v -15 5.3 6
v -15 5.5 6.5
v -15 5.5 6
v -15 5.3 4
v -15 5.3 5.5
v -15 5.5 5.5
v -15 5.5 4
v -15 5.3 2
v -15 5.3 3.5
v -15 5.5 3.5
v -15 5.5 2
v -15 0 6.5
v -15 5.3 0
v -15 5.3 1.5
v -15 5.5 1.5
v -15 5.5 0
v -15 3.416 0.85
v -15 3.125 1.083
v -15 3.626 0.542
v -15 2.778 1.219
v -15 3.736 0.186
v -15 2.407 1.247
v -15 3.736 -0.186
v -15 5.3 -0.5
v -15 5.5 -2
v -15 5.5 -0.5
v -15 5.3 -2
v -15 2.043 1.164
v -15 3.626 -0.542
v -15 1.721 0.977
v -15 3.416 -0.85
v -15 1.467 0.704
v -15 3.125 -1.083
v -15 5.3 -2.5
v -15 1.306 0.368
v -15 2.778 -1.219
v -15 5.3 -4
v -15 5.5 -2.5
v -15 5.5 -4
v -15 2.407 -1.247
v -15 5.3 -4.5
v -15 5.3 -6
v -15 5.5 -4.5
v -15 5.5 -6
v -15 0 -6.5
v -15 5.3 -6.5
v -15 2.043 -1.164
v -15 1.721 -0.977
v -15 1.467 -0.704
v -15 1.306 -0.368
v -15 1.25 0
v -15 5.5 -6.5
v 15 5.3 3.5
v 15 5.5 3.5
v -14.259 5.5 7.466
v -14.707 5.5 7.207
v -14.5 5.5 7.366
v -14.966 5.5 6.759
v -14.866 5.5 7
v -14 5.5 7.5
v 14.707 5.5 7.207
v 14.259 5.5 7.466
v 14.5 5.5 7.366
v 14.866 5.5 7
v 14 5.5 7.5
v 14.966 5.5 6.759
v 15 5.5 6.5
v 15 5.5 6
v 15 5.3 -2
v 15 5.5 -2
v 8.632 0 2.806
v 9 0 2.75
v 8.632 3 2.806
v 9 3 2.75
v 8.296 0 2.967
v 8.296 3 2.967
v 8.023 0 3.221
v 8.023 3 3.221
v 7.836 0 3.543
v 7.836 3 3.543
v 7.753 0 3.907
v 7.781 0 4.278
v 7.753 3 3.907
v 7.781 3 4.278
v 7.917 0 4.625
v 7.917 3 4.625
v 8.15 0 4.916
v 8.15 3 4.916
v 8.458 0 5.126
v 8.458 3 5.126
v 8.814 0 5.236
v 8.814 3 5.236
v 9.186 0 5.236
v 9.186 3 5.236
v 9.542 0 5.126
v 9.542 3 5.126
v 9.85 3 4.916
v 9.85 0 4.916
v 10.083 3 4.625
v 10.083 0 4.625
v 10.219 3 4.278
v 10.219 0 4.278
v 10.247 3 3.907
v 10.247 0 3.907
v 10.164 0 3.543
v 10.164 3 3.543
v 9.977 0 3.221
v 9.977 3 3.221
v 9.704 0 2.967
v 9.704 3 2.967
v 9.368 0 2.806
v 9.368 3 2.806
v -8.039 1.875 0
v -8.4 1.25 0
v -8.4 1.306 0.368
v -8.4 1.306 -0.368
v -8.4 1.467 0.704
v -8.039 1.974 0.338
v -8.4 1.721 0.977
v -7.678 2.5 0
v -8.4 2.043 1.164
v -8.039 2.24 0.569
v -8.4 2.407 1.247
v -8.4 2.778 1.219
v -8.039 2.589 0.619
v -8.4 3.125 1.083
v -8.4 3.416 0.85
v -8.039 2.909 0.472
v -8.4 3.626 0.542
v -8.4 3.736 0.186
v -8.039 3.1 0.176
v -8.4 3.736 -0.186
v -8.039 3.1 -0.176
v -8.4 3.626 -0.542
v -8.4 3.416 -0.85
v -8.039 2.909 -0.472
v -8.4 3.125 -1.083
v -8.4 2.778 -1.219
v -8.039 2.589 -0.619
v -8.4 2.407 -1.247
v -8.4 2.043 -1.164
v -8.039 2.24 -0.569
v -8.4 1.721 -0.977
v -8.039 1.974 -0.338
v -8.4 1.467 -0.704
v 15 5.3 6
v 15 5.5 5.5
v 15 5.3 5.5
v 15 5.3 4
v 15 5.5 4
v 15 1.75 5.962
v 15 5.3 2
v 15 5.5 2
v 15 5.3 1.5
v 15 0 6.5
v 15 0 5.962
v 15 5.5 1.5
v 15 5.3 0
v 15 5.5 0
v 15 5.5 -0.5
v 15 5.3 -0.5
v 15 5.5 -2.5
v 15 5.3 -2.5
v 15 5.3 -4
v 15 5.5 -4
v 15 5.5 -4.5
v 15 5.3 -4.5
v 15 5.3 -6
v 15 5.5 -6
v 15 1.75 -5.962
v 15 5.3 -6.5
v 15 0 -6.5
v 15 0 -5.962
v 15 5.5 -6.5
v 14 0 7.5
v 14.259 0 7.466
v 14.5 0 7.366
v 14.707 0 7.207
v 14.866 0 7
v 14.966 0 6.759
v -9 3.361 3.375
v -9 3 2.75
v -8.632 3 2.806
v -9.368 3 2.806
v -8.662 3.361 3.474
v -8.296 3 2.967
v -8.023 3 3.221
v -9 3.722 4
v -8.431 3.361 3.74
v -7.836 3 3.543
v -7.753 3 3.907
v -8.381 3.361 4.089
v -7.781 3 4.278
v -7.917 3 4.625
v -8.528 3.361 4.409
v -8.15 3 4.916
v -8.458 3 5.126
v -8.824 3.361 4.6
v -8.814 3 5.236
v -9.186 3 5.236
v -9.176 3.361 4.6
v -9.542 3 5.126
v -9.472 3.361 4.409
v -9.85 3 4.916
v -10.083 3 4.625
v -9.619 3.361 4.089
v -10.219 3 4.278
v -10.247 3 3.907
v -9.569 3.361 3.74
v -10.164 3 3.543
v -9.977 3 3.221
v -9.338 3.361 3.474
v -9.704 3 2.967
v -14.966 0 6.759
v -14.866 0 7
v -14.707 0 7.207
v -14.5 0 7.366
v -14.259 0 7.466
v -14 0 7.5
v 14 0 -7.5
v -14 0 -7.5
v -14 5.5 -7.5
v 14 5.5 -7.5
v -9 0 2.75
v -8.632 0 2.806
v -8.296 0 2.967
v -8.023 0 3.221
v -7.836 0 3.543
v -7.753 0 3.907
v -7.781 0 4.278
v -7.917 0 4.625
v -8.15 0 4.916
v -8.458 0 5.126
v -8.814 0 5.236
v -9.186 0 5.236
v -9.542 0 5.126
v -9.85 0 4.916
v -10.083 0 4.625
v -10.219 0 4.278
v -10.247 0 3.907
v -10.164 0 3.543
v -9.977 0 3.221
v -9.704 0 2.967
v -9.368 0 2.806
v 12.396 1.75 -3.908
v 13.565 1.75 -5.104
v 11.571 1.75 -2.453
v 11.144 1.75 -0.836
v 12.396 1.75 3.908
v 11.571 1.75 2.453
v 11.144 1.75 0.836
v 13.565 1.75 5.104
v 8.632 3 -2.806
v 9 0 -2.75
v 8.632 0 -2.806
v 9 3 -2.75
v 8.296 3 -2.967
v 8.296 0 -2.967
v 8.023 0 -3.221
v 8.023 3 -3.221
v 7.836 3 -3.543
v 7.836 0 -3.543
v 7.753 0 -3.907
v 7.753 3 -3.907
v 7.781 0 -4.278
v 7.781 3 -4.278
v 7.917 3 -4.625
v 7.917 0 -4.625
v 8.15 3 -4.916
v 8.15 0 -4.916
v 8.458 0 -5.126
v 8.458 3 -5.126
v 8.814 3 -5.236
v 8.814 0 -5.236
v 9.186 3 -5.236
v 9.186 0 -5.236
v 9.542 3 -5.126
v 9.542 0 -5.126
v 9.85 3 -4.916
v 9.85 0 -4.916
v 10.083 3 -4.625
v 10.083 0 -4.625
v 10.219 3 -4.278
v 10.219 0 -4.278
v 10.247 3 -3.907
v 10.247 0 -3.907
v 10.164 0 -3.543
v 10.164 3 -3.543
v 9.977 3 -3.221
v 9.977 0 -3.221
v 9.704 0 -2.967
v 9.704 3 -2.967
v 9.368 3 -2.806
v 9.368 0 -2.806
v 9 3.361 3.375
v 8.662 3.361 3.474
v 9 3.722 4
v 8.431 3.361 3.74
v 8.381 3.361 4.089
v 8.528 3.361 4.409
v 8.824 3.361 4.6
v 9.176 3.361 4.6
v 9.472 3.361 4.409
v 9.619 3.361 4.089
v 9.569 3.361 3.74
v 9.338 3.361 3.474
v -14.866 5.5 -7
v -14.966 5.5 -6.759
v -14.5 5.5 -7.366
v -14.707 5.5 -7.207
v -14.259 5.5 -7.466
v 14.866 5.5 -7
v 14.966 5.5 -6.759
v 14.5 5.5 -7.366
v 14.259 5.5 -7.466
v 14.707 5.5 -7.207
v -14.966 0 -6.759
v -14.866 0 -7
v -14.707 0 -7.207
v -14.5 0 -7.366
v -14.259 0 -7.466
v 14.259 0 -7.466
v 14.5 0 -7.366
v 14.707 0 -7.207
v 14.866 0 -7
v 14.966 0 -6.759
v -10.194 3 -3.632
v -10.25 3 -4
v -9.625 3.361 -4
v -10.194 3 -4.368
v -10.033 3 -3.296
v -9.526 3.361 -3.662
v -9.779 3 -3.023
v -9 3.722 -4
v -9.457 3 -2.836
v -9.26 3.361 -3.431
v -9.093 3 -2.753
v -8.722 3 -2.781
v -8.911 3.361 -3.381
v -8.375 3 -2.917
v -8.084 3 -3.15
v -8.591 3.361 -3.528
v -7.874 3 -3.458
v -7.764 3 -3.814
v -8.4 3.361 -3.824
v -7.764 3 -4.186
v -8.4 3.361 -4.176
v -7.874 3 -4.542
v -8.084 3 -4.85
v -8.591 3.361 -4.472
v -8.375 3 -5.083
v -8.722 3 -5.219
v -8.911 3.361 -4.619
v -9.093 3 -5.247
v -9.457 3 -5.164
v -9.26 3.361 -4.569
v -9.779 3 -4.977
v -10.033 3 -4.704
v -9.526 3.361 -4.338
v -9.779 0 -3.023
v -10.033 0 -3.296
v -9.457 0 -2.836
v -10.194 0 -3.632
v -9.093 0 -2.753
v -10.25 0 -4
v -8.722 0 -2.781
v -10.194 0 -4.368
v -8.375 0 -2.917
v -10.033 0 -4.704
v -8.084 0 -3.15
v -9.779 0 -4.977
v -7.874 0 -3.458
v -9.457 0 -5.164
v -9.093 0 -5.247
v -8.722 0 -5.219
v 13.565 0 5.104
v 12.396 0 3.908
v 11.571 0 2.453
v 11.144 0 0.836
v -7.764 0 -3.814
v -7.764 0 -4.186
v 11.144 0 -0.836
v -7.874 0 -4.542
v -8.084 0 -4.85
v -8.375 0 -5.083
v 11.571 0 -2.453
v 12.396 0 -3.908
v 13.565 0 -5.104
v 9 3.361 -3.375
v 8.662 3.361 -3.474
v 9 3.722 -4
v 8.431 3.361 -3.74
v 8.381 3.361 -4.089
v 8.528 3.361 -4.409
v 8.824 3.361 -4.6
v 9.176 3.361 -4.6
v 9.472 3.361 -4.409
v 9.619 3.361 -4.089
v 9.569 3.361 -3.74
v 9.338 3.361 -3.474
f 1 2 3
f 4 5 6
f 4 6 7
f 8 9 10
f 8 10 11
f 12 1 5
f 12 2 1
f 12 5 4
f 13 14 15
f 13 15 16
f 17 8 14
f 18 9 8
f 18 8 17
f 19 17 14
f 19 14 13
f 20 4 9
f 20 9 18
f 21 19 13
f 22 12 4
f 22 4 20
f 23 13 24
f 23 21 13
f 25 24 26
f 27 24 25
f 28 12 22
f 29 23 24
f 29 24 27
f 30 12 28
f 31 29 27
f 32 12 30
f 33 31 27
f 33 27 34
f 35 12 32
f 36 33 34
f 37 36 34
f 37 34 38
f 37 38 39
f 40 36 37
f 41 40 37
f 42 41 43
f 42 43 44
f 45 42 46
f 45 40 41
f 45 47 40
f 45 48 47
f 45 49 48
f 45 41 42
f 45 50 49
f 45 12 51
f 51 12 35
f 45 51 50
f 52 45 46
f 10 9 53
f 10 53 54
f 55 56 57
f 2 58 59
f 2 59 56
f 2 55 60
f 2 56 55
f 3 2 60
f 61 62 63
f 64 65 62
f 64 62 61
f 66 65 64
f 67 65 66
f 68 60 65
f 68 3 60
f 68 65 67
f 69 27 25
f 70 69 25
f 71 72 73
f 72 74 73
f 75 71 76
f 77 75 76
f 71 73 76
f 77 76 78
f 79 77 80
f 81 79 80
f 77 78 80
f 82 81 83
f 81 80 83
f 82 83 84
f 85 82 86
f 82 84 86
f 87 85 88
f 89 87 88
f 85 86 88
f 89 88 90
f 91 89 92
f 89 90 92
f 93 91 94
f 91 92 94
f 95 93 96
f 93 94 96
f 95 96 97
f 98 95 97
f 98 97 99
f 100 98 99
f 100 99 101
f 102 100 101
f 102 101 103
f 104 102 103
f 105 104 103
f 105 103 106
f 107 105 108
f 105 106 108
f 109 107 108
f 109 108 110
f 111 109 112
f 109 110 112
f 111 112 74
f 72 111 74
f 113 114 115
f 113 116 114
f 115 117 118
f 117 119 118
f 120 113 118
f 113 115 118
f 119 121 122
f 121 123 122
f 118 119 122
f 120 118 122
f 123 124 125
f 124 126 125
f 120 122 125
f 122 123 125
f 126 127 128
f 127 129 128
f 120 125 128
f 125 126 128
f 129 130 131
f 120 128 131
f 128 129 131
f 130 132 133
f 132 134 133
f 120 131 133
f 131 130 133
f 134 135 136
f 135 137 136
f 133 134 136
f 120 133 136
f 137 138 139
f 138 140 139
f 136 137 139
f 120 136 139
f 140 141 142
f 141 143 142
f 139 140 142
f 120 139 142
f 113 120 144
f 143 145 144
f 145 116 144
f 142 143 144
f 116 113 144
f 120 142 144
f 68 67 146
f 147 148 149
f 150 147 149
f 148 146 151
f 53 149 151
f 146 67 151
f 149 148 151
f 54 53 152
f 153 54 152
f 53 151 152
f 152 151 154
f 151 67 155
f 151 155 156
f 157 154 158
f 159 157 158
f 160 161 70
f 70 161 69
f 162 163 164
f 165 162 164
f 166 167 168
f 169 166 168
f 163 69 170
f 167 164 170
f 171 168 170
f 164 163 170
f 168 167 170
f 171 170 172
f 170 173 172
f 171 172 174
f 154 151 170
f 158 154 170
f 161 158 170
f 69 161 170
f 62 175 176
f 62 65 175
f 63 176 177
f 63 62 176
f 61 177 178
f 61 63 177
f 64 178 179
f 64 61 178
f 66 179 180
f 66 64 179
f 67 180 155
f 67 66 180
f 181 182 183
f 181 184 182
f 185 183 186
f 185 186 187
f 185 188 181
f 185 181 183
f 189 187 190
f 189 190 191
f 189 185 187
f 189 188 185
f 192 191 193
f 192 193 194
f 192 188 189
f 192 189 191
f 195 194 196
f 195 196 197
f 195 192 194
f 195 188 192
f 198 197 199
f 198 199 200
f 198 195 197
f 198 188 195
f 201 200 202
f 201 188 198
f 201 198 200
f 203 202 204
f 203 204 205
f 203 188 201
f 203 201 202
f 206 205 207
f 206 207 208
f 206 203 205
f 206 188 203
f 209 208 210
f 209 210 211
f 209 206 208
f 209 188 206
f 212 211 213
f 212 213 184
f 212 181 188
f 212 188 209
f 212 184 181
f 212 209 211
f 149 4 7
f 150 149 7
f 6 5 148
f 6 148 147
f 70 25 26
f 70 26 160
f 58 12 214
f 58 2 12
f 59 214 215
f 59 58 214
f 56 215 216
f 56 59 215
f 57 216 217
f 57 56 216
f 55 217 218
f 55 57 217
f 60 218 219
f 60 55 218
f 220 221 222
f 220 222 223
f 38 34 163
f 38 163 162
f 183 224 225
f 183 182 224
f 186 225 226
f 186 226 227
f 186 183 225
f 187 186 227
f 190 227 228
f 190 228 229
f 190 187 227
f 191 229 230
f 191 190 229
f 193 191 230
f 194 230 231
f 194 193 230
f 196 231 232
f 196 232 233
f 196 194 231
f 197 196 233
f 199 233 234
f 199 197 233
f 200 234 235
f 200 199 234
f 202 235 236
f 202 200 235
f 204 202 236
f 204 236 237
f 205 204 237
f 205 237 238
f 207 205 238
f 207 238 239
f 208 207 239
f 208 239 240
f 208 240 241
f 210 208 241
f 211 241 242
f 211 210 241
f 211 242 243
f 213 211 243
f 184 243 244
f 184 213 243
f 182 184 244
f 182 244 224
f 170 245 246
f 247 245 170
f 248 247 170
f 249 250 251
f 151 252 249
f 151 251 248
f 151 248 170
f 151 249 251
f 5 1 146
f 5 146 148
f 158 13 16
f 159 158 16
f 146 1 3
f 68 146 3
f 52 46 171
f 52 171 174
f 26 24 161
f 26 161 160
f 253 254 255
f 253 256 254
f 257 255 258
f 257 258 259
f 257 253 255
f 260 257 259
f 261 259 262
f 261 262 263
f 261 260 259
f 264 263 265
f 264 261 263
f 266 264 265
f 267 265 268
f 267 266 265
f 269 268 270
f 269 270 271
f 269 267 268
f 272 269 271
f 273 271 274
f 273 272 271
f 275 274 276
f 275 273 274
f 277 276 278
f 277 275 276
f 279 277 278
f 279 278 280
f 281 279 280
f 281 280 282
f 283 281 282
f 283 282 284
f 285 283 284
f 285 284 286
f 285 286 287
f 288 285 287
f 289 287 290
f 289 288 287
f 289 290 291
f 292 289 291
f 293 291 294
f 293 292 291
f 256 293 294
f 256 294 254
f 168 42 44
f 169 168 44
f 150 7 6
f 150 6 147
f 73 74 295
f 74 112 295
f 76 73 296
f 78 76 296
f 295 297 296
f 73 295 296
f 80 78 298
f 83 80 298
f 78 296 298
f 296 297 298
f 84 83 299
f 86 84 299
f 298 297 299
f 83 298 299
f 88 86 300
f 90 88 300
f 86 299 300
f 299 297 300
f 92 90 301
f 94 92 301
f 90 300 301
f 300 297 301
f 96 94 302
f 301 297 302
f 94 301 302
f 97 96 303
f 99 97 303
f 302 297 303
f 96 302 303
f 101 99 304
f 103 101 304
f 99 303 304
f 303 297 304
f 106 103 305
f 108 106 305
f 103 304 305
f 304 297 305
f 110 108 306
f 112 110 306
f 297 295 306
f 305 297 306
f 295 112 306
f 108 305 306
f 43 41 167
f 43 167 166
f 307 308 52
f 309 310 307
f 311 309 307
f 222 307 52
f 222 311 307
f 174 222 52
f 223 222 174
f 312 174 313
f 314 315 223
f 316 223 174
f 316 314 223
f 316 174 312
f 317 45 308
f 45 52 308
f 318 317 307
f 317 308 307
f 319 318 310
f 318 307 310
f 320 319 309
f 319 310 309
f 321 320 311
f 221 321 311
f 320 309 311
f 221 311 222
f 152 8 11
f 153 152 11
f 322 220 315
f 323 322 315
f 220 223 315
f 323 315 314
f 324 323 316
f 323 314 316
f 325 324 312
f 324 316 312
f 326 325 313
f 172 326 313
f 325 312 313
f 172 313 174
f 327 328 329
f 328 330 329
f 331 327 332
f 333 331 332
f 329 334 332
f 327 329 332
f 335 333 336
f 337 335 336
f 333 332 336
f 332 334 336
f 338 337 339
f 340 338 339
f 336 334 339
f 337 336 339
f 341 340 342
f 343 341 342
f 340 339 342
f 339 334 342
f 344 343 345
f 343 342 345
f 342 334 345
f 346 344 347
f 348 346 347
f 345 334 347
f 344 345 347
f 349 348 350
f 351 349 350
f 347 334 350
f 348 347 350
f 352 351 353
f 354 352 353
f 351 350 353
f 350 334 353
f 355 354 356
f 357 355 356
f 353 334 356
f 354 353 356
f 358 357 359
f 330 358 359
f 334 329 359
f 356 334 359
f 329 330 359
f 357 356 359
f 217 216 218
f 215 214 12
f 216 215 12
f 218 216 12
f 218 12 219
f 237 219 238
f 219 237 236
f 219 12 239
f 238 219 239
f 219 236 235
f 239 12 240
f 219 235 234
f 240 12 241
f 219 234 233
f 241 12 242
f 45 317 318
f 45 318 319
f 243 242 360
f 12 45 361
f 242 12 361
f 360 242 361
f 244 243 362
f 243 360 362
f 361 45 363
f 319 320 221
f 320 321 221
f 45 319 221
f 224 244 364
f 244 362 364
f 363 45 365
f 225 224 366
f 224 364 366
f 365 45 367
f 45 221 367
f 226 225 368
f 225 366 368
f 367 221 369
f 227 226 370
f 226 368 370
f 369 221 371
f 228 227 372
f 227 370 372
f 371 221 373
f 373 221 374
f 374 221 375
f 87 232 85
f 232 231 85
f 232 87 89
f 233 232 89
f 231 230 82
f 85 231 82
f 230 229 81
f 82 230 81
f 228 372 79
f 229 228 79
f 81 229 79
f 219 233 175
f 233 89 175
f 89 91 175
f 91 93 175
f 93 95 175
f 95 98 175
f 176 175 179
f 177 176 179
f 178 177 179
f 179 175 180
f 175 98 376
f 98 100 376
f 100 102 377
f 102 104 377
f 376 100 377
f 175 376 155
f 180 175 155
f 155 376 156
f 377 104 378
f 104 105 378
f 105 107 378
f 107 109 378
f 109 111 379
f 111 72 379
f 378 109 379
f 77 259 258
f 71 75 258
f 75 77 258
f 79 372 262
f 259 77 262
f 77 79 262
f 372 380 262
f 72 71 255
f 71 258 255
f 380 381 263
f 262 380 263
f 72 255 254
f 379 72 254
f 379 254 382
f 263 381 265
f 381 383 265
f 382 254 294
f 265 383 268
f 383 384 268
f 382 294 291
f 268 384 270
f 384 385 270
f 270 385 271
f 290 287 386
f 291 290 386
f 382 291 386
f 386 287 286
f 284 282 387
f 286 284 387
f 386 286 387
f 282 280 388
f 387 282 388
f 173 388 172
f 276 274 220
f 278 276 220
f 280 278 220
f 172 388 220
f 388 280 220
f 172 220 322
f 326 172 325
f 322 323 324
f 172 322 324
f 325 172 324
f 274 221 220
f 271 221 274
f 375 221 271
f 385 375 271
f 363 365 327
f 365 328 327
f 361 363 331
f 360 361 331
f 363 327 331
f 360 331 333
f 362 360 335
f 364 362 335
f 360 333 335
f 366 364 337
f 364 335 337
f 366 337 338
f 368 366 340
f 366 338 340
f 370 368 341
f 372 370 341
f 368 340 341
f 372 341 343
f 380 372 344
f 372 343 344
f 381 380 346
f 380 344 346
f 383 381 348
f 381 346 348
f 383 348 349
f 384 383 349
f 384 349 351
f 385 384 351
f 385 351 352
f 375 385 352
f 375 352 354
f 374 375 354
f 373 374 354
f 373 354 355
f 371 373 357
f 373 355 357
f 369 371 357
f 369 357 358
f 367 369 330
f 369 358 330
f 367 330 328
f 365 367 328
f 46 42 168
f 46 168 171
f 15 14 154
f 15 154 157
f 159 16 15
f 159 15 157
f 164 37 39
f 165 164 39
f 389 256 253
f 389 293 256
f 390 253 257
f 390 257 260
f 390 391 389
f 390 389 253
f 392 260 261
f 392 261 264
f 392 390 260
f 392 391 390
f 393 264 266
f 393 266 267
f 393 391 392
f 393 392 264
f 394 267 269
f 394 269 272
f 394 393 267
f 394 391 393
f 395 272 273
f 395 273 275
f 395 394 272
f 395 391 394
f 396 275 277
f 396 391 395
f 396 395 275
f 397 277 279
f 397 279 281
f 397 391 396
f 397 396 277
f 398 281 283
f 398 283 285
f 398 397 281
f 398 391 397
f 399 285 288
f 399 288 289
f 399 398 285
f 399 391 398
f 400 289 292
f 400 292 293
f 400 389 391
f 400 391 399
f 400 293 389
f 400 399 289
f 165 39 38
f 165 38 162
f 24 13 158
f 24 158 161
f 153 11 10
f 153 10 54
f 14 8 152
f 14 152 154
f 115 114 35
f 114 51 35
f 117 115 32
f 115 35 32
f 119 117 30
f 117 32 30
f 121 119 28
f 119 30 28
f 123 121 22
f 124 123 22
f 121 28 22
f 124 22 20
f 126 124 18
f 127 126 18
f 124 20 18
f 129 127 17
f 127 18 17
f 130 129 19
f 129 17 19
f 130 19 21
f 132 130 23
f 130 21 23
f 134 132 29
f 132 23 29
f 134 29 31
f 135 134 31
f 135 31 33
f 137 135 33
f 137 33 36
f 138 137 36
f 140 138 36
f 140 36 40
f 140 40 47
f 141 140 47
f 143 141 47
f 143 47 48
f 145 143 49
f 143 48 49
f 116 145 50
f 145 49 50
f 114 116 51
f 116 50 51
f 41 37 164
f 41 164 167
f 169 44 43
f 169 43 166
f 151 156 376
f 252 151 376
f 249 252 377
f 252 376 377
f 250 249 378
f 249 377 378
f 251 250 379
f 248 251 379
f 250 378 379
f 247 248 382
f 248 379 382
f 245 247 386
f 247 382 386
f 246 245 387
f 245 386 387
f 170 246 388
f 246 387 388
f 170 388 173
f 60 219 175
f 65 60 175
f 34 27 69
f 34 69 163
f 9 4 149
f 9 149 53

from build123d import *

# Parameters (mm, degrees)
SKETCH1_W               = 30
SKETCH1_H               = 15
BOSS_EXTRUDE1_DEPTH     = 5.5
CUT_EXTRUDE2_DEPTH      = 18.649362595
CUT_EXTRUDE2_DEPTH_BACK = 18.649362595
SKETCH2_W               = 0.5
SKETCH2_H               = 0.2
SKETCH7_R               = 6.5
CUT_EXTRUDE6_DEPTH      = 1.75
FILLET1_R               = 1


with BuildPart() as part:
    # Sketch1 → Boss-Extrude1 (new body)
    with BuildSketch(Plane(origin=(0, 0, 0), x_dir=(1, 0, 0), z_dir=(0, 1, 0))):
        Rectangle(SKETCH1_W, SKETCH1_H)
    extrude(amount=BOSS_EXTRUDE1_DEPTH)

    # Sketch2 → Cut-Extrude2 (cut, two sides: drawn at the far end of the back side and taken through both)
    with BuildSketch(Plane(origin=(0, 0, 0), x_dir=(0, 0, -1), z_dir=(1, 0, 0)).offset(-CUT_EXTRUDE2_DEPTH_BACK)):
        with Locations((-5.75, 5.4)):
            Rectangle(SKETCH2_W, SKETCH2_H)
        with Locations((-3.75, 5.4)):
            Rectangle(SKETCH2_W, SKETCH2_H)
        with Locations((-1.75, 5.4)):
            Rectangle(SKETCH2_W, SKETCH2_H)
        with Locations((0.25, 5.4)):
            Rectangle(SKETCH2_W, SKETCH2_H)
        with Locations((2.25, 5.4)):
            Rectangle(SKETCH2_W, SKETCH2_H)
        with Locations((4.25, 5.4)):
            Rectangle(SKETCH2_W, SKETCH2_H)
        with Locations((6.25, 5.4)):
            Rectangle(SKETCH2_W, SKETCH2_H)
    extrude(amount=CUT_EXTRUDE2_DEPTH + CUT_EXTRUDE2_DEPTH_BACK, mode=Mode.SUBTRACT)

    # Sketch8 → Cut-Revolve1 (revolve, cut)
    with BuildSketch(Plane.XY.offset(4), mode=Mode.PRIVATE) as cut_revolve1_sk:
        Polygon((10.25, 0), (10.25, 3), (9, 3.721687836), (9, 0), align=None)
    cut_revolve1 = revolve(cut_revolve1_sk.sketch.rotate(Axis((9, 0, 4), (0, 1, 0)), 90), axis=Axis((9, 0, 4), (0, 1, 0)), mode=Mode.SUBTRACT)

    # Mirror1: Cut-Revolve1 across plane
    add(cut_revolve1.mirror(Plane.XY), mode=Mode.SUBTRACT)

    # Mirror2: Cut-Revolve1 across plane
    add(cut_revolve1.mirror(Plane(origin=(0, 0, 0), x_dir=(0, 0, 1), z_dir=(1, 0, 0))), mode=Mode.SUBTRACT)

    # Mirror2 copy 1 sketch → Mirror2 copy 1 (revolve, cut)
    with BuildSketch(Plane(origin=(0, 0, -4), x_dir=(-1, 0, 0), z_dir=(0, 0, -1))):
        Polygon((10.25, 0), (10.25, 3), (9, 3.721687836), (9, 0), align=None)
    revolve(axis=Axis((-9, 0, -4), (0, 1, 0)), mode=Mode.SUBTRACT)

    # Sketch9 → Cut-Revolve2 (revolve, cut)
    with BuildSketch(Plane.XY, mode=Mode.PRIVATE) as cut_revolve2_sk:
        Polygon((-15, 2.5), (-7.678312164, 2.5), (-8.4, 3.75), (-15, 3.75), align=None)
    revolve(cut_revolve2_sk.sketch.rotate(Axis((-15, 2.5, 0), (-1, 0, 0)), 180), axis=Axis((-15, 2.5, 0), (-1, 0, 0)), mode=Mode.SUBTRACT)

    # Sketch7 → Cut-Extrude6 (cut)
    with BuildSketch(Plane.XZ):
        with Locations((17.59, 0)):
            Circle(SKETCH7_R)
    extrude(amount=-CUT_EXTRUDE6_DEPTH, mode=Mode.SUBTRACT)

    # Fillet1
    fillet1_edges = [part.edges().sort_by_distance(p)[0] for p in [
        (-15, 2.75, -7.5),
        (15, 2.75, -7.5),
        (15, 2.75, 7.5),
        (-15, 2.75, 7.5),
    ]]
    fillet(fillet1_edges, radius=FILLET1_R - 0.0001)  # a hair under: the kernel refuses the full size


solid = part.part
